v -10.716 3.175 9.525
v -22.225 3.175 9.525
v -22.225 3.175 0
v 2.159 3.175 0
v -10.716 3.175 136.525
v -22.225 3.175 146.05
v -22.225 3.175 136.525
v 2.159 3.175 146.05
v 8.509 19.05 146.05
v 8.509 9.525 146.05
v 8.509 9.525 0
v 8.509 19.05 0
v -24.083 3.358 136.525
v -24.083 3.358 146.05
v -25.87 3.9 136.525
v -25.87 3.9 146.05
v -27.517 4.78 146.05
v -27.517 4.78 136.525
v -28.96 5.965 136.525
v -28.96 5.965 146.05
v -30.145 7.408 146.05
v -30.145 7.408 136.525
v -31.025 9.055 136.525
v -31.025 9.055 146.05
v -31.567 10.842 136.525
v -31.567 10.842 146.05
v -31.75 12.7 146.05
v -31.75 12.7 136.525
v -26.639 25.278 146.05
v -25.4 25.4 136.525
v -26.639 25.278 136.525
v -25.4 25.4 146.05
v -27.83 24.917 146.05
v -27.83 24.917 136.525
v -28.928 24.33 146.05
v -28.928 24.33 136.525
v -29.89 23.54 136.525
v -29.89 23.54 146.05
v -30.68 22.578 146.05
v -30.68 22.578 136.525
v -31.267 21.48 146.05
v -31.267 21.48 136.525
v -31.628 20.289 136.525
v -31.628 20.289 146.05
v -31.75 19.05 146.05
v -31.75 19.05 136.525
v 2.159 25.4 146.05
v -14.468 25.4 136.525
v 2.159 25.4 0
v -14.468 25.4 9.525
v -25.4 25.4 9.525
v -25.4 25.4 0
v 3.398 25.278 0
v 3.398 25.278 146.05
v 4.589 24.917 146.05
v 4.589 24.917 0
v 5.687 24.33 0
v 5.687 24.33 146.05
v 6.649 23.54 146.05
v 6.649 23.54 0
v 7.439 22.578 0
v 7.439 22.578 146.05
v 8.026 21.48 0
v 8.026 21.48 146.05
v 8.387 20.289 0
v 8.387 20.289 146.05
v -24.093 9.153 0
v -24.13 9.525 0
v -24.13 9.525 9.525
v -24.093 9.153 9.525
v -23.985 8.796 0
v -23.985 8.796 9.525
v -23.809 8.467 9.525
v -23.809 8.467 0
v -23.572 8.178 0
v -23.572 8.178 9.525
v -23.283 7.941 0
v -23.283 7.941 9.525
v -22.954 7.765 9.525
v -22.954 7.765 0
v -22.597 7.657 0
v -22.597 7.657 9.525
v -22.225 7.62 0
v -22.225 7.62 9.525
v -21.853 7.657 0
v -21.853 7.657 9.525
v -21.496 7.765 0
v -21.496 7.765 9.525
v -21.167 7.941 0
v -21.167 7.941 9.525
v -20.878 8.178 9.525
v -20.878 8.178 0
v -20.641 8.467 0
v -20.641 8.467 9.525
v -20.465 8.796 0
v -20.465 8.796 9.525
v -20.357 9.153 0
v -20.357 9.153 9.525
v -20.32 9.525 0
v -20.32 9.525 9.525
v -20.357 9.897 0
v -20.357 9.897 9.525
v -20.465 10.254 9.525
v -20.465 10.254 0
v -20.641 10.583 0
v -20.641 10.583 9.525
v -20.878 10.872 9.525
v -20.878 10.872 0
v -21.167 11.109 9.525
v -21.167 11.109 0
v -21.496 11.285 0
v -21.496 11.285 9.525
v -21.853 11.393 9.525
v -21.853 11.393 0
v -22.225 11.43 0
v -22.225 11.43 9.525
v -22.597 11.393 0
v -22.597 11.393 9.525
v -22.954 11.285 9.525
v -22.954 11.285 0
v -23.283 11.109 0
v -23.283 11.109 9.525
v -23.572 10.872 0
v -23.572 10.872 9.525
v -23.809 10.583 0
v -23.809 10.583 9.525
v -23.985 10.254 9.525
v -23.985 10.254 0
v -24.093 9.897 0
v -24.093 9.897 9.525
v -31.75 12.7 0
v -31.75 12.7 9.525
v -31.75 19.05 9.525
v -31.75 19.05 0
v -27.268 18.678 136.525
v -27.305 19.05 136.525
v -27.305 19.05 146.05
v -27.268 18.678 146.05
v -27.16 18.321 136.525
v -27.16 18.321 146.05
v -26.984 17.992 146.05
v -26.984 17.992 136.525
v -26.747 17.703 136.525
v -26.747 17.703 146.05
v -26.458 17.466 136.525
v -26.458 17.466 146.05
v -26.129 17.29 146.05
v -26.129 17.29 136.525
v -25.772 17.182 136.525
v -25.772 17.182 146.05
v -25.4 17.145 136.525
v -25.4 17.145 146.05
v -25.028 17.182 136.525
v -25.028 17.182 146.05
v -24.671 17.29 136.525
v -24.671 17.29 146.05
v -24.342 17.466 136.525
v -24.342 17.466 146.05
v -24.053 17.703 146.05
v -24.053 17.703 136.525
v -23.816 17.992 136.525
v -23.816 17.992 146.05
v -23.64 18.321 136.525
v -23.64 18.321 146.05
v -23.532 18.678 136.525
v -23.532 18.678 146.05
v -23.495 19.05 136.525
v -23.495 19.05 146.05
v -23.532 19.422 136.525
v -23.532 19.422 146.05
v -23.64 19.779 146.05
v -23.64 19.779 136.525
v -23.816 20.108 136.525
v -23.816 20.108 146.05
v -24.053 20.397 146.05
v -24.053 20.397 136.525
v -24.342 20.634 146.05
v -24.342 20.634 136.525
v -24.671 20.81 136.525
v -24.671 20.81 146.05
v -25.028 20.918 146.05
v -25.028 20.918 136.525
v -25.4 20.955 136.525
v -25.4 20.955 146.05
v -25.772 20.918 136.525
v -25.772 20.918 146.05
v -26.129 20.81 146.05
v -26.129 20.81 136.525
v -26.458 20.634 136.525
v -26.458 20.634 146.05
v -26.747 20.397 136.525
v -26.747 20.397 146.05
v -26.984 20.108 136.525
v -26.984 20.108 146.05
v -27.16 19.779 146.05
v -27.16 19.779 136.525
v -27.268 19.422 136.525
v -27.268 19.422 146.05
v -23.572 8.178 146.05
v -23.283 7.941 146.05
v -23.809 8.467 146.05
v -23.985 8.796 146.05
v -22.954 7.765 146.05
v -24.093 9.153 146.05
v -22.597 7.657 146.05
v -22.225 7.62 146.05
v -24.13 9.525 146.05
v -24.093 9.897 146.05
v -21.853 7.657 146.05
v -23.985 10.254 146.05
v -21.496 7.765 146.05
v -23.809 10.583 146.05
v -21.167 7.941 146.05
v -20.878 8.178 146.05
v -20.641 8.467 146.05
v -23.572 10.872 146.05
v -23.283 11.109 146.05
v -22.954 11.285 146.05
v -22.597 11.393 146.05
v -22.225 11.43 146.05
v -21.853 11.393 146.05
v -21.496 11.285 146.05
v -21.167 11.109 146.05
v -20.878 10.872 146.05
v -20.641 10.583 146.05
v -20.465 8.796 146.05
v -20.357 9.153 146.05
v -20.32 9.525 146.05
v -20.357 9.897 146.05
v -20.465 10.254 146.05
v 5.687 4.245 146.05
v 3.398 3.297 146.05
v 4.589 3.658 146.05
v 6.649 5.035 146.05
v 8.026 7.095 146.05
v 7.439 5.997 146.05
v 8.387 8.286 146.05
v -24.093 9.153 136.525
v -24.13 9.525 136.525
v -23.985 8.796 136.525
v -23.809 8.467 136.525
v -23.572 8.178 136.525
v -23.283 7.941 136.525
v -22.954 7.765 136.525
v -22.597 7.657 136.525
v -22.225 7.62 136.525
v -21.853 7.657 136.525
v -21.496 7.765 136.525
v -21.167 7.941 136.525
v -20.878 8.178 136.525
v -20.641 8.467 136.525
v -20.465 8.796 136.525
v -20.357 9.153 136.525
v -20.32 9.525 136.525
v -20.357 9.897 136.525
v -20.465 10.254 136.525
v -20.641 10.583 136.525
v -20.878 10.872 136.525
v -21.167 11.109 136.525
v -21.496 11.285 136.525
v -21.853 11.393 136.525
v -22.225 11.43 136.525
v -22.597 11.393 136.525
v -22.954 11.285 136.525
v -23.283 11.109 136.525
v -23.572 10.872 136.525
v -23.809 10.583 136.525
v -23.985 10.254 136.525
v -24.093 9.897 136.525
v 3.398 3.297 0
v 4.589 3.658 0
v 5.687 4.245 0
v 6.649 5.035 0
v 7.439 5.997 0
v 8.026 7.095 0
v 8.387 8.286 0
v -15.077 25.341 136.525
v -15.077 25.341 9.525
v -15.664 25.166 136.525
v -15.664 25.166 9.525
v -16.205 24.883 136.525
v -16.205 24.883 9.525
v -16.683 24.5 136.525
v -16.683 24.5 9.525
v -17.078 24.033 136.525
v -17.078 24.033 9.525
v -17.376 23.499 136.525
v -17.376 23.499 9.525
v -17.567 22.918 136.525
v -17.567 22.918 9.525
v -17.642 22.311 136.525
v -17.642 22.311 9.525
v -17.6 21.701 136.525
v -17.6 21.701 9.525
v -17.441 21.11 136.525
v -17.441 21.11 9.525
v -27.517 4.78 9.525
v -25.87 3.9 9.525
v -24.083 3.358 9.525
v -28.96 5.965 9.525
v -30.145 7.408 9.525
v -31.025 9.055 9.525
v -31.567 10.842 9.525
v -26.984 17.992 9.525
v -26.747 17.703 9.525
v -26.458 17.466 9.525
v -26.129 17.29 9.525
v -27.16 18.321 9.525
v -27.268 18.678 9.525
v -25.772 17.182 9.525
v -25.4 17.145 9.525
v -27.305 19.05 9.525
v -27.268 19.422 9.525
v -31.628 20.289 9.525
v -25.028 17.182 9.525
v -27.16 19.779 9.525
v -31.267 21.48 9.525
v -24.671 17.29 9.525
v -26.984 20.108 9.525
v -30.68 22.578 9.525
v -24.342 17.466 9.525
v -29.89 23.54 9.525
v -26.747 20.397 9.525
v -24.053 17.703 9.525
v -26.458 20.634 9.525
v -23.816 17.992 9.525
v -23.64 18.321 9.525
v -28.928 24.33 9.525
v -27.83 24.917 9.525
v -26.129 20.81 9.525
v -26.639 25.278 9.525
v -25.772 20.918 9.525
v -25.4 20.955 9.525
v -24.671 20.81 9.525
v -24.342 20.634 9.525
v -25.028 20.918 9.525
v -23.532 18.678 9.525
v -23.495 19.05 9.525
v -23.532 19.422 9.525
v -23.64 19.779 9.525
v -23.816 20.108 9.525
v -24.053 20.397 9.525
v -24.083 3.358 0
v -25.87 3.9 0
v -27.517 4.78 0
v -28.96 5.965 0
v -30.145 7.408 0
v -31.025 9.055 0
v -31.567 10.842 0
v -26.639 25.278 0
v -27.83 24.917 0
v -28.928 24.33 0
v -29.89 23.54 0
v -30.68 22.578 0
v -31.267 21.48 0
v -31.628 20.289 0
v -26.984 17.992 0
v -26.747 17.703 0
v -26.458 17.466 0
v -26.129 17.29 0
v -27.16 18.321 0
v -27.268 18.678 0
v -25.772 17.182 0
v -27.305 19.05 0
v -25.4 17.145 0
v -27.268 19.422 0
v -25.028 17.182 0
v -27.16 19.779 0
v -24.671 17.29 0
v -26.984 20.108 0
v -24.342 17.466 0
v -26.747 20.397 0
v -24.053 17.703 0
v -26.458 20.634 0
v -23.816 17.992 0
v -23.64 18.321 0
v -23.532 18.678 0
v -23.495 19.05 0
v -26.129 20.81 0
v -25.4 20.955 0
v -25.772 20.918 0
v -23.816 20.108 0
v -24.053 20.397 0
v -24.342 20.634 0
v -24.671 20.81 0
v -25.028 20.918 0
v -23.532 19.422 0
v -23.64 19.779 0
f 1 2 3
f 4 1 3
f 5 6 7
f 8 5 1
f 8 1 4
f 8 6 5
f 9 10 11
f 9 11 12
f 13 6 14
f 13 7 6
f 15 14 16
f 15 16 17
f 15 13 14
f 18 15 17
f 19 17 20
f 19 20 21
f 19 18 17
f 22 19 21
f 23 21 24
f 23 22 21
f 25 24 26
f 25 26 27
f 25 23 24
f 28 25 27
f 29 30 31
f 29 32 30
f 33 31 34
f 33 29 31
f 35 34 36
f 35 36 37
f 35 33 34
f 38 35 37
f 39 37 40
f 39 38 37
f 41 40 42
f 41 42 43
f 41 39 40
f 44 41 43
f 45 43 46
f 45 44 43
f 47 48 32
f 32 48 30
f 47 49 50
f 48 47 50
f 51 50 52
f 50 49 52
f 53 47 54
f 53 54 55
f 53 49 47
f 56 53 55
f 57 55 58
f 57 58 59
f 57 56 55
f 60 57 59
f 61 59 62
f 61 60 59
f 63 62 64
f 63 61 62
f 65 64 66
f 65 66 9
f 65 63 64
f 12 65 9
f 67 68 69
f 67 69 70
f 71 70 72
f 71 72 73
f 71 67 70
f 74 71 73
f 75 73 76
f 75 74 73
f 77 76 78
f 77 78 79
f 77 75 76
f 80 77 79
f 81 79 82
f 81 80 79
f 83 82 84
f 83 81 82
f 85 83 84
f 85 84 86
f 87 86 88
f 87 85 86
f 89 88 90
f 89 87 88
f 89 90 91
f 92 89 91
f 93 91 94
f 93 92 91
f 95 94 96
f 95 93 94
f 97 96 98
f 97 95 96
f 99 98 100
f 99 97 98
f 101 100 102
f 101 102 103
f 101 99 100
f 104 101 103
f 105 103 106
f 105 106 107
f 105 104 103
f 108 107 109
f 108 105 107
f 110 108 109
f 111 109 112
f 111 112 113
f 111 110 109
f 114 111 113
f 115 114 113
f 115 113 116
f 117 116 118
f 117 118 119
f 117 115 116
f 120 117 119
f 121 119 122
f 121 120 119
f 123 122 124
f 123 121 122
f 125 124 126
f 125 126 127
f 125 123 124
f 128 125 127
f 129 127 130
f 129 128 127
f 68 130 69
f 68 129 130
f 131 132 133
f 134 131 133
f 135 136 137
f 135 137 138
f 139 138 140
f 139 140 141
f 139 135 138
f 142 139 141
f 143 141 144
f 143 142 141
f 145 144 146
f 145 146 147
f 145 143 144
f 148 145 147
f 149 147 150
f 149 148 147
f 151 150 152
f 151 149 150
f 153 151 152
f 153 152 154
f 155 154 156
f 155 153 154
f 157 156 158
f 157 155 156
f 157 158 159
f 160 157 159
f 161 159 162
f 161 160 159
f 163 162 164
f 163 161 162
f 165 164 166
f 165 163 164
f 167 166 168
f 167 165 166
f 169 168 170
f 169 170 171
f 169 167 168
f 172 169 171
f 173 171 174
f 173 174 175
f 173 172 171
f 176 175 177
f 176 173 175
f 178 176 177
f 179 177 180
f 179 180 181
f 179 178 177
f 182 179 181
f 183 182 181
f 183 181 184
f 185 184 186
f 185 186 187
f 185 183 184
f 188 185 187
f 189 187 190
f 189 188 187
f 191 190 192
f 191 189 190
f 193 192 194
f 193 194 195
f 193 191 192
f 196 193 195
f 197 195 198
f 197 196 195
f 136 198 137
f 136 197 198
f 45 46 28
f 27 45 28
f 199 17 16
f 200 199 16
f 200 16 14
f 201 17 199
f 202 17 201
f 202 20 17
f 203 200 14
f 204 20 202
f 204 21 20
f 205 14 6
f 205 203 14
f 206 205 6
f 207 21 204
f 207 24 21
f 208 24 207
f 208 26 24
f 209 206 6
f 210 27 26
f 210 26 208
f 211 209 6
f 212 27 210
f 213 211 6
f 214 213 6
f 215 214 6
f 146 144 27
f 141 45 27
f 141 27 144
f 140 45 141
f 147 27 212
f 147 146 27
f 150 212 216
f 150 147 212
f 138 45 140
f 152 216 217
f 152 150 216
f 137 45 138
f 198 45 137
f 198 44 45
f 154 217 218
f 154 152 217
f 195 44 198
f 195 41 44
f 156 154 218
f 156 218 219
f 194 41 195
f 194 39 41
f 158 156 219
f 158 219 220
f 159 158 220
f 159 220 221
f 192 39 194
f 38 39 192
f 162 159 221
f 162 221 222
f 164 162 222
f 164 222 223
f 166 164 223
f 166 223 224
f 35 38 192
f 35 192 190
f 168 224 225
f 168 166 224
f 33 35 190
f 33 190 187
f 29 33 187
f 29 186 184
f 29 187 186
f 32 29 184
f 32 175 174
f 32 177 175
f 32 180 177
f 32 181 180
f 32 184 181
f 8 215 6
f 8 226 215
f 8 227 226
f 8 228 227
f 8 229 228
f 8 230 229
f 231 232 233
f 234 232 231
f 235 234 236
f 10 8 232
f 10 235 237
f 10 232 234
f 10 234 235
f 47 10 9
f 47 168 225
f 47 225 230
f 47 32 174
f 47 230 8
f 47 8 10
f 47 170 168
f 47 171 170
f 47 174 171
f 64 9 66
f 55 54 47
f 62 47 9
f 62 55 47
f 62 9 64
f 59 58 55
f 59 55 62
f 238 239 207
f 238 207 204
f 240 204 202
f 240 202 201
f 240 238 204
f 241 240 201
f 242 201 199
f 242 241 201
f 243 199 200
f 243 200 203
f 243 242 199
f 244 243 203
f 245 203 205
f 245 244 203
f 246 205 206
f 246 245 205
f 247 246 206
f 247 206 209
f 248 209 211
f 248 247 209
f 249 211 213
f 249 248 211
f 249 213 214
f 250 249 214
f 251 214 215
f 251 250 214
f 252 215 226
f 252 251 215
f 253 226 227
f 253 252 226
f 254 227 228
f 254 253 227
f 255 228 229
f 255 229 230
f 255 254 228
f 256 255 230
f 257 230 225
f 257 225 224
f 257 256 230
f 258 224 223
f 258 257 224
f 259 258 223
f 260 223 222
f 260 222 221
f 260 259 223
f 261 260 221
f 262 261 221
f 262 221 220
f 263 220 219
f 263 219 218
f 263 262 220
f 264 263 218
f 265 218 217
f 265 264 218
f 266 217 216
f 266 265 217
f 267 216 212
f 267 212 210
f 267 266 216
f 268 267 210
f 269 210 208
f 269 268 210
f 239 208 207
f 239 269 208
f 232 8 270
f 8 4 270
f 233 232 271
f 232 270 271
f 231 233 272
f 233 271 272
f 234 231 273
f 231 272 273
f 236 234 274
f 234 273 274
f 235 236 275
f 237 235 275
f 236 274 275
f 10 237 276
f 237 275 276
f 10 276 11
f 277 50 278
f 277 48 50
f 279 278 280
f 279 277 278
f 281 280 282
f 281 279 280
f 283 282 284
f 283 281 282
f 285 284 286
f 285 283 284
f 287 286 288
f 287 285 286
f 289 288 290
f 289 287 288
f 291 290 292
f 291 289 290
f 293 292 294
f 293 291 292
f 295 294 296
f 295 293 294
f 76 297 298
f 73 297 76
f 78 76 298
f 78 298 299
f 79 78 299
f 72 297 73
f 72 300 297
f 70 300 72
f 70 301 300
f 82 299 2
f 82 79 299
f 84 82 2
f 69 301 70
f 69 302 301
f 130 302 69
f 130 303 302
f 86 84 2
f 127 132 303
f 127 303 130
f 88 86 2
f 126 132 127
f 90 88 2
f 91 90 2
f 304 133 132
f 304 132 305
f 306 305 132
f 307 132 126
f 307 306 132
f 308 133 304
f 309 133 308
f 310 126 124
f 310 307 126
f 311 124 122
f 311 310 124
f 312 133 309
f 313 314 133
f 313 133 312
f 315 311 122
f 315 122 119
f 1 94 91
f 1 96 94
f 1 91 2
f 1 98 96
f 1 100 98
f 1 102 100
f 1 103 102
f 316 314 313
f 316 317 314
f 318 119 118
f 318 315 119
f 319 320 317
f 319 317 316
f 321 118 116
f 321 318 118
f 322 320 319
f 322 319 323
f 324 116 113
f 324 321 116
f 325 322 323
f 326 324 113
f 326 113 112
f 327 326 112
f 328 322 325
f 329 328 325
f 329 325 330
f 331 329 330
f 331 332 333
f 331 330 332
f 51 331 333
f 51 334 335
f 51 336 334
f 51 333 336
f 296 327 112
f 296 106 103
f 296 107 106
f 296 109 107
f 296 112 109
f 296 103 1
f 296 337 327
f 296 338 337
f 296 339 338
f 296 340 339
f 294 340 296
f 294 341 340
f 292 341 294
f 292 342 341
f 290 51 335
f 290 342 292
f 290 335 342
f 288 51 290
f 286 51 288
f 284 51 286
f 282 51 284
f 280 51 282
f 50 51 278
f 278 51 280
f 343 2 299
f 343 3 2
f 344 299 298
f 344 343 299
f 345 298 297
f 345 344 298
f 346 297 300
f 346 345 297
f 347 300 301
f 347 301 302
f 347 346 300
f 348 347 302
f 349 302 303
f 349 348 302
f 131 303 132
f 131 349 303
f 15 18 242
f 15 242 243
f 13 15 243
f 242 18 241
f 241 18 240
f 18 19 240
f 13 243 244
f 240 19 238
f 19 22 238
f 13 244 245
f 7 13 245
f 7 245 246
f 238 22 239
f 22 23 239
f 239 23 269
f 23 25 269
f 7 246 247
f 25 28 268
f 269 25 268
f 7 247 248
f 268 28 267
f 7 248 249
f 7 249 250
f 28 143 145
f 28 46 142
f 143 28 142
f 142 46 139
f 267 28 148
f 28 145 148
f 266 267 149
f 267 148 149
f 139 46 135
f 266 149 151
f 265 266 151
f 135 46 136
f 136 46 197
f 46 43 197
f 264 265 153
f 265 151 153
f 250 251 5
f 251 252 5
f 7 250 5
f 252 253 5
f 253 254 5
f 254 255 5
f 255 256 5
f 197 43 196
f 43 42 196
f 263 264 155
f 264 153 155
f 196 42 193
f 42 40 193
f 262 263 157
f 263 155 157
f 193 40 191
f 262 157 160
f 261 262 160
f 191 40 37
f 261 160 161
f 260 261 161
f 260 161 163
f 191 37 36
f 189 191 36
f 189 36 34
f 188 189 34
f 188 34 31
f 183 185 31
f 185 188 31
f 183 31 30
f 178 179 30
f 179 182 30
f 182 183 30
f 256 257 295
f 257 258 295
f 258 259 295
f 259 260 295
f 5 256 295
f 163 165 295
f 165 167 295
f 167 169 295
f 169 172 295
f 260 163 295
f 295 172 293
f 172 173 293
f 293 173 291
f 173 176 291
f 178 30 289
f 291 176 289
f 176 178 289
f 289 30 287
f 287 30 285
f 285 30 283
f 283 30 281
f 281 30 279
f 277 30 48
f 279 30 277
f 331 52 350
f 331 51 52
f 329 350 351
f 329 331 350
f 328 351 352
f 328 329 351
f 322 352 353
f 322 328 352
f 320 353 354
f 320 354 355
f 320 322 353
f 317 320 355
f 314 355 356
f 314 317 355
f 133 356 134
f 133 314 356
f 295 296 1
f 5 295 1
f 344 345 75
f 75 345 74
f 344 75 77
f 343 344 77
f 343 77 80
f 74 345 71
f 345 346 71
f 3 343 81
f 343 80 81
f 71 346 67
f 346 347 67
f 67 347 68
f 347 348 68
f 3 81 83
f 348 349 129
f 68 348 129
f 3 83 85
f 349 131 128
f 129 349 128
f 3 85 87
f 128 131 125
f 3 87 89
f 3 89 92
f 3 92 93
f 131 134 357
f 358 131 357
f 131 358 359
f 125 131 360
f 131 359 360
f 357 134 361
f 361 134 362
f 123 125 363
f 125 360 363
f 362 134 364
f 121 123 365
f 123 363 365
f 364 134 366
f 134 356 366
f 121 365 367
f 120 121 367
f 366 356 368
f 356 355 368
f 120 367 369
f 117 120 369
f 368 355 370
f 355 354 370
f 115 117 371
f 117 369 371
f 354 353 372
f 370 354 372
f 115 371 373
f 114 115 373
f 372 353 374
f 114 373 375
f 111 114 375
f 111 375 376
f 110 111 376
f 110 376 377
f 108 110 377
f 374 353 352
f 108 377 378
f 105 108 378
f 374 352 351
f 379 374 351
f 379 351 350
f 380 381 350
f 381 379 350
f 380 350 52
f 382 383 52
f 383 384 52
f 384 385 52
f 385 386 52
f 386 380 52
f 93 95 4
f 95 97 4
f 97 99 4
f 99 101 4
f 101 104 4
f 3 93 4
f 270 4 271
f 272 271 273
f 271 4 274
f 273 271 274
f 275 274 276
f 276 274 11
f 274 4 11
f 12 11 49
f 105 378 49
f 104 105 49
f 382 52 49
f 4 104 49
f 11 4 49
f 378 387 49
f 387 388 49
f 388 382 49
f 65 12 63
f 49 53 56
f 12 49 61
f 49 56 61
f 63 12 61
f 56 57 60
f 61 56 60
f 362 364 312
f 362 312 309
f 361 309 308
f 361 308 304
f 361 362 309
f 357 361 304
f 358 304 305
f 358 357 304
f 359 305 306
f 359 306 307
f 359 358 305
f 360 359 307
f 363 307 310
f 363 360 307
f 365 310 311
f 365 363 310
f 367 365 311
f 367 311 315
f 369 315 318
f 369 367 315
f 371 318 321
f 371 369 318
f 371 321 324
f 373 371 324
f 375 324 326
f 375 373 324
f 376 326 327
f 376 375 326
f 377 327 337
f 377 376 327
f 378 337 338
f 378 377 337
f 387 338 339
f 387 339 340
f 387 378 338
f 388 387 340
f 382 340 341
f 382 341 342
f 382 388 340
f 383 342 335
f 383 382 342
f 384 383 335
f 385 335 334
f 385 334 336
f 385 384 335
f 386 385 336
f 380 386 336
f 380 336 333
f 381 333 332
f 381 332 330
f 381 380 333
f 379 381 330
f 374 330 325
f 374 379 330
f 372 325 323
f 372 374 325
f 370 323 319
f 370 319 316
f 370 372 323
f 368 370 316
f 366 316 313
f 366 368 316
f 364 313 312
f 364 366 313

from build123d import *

# Parameters (mm, degrees)
SKETCH1_W           = 40.259
SKETCH1_H           = 25.4
SKETCH1_R           = 1.905
BOSS_EXTRUDE1_DEPTH = 9.525
BOSS_EXTRUDE2_DEPTH = 127
SKETCH3_R           = 1.905
BOSS_EXTRUDE3_DEPTH = 9.525
FILLET2_R           = 6.35
FILLET3_R           = 3.175
CUT_EXTRUDE1_REACH  = 153.604
SKETCH4_W           = 40.259
SKETCH4_H           = 3.175
FILLET4_R           = 9.525
FILLET6_R           = 6.35


with BuildPart() as part:
    # Sketch1 → Boss-Extrude1 (new body)
    with BuildSketch(Plane.XY):
        with Locations((-11.6205, 12.7)):
            Rectangle(SKETCH1_W, SKETCH1_H)
        with Locations(Location((-22.225, 9.525, 0), (0, 0, 180))):
            Circle(SKETCH1_R, mode=Mode.SUBTRACT)
        with Locations(Location((-25.4, 19.05, 0), (0, 0, 180))):
            Circle(SKETCH1_R, mode=Mode.SUBTRACT)
    extrude(amount=BOSS_EXTRUDE1_DEPTH)

    # Sketch2 → Boss-Extrude2 (add)
    with BuildSketch(Plane.XY.offset(9.525)):
        Polygon((-19.05, 25.4), (-9.525, 0), (8.509, 0), (8.509, 25.4), align=None)
    extrude(amount=BOSS_EXTRUDE2_DEPTH)

    # Sketch3 → Boss-Extrude3 (add)
    with BuildSketch(Plane.XY.offset(136.525)):
        Polygon((8.509, 25.4), (-19.05, 25.4), (-31.75, 25.4), (-31.75, 0), (-9.525, 0), (8.509, 0), align=None)
        with Locations(Location((-25.4, 19.05, 0), (0, 0, 180))):
            Circle(SKETCH3_R, mode=Mode.SUBTRACT)
        with Locations(Location((-22.225, 9.525, 0), (0, 0, 180))):
            Circle(SKETCH3_R, mode=Mode.SUBTRACT)
    extrude(amount=BOSS_EXTRUDE3_DEPTH)

    # Fillet2
    fillet2_edges = [part.edges().sort_by_distance(p)[0] for p in [
        (-31.75, 25.4, 4.7625),
        (8.509, 25.4, 73.025),
        (-31.75, 25.4, 141.2875),
    ]]
    fillet(fillet2_edges, radius=FILLET2_R)

    # Fillet3
    fillet3_edges = [part.edges().sort_by_distance(p)[0] for p in [
        (-19.05, 25.4, 73.025),
    ]]
    fillet(fillet3_edges, radius=FILLET3_R)

    # Cut-Extrude1: up to this face of the body (flat: up to its plane)
    cut_extrude1_end = Plane(part.part.faces().sort_by_distance((-11.337539772, 12.464426548, 0))[0])
    # Sketch4 → Cut-Extrude1 (cut, up to the picked face)
    with BuildSketch(Plane.XY.offset(146.05), mode=Mode.PRIVATE) as cut_extrude1_sk1:
        with Locations((-11.6205, 1.5875)):
            Rectangle(SKETCH4_W, SKETCH4_H)
    cut_extrude1_tool1 = split(extrude(cut_extrude1_sk1.sketch, amount=-CUT_EXTRUDE1_REACH, mode=Mode.PRIVATE), bisect_by=cut_extrude1_end, keep=Keep.BOTH, mode=Mode.PRIVATE)
    add(cut_extrude1_tool1.solids().sort_by(Axis((-11.6205, 1.5875, 146.05), (0, 0, -1)))[0], mode=Mode.SUBTRACT)

    # Fillet4
    fillet4_edges = [part.edges().sort_by_distance(p)[0] for p in [
        (-31.75, 3.175, 141.2875),
        (-31.75, 3.175, 4.7625),
    ]]
    fillet(fillet4_edges, radius=FILLET4_R)

    # Fillet6
    fillet6_edges = [part.edges().sort_by_distance(p)[0] for p in [
        (8.509, 3.175, 73.025),
    ]]
    fillet(fillet6_edges, radius=FILLET6_R)


solid = part.part
